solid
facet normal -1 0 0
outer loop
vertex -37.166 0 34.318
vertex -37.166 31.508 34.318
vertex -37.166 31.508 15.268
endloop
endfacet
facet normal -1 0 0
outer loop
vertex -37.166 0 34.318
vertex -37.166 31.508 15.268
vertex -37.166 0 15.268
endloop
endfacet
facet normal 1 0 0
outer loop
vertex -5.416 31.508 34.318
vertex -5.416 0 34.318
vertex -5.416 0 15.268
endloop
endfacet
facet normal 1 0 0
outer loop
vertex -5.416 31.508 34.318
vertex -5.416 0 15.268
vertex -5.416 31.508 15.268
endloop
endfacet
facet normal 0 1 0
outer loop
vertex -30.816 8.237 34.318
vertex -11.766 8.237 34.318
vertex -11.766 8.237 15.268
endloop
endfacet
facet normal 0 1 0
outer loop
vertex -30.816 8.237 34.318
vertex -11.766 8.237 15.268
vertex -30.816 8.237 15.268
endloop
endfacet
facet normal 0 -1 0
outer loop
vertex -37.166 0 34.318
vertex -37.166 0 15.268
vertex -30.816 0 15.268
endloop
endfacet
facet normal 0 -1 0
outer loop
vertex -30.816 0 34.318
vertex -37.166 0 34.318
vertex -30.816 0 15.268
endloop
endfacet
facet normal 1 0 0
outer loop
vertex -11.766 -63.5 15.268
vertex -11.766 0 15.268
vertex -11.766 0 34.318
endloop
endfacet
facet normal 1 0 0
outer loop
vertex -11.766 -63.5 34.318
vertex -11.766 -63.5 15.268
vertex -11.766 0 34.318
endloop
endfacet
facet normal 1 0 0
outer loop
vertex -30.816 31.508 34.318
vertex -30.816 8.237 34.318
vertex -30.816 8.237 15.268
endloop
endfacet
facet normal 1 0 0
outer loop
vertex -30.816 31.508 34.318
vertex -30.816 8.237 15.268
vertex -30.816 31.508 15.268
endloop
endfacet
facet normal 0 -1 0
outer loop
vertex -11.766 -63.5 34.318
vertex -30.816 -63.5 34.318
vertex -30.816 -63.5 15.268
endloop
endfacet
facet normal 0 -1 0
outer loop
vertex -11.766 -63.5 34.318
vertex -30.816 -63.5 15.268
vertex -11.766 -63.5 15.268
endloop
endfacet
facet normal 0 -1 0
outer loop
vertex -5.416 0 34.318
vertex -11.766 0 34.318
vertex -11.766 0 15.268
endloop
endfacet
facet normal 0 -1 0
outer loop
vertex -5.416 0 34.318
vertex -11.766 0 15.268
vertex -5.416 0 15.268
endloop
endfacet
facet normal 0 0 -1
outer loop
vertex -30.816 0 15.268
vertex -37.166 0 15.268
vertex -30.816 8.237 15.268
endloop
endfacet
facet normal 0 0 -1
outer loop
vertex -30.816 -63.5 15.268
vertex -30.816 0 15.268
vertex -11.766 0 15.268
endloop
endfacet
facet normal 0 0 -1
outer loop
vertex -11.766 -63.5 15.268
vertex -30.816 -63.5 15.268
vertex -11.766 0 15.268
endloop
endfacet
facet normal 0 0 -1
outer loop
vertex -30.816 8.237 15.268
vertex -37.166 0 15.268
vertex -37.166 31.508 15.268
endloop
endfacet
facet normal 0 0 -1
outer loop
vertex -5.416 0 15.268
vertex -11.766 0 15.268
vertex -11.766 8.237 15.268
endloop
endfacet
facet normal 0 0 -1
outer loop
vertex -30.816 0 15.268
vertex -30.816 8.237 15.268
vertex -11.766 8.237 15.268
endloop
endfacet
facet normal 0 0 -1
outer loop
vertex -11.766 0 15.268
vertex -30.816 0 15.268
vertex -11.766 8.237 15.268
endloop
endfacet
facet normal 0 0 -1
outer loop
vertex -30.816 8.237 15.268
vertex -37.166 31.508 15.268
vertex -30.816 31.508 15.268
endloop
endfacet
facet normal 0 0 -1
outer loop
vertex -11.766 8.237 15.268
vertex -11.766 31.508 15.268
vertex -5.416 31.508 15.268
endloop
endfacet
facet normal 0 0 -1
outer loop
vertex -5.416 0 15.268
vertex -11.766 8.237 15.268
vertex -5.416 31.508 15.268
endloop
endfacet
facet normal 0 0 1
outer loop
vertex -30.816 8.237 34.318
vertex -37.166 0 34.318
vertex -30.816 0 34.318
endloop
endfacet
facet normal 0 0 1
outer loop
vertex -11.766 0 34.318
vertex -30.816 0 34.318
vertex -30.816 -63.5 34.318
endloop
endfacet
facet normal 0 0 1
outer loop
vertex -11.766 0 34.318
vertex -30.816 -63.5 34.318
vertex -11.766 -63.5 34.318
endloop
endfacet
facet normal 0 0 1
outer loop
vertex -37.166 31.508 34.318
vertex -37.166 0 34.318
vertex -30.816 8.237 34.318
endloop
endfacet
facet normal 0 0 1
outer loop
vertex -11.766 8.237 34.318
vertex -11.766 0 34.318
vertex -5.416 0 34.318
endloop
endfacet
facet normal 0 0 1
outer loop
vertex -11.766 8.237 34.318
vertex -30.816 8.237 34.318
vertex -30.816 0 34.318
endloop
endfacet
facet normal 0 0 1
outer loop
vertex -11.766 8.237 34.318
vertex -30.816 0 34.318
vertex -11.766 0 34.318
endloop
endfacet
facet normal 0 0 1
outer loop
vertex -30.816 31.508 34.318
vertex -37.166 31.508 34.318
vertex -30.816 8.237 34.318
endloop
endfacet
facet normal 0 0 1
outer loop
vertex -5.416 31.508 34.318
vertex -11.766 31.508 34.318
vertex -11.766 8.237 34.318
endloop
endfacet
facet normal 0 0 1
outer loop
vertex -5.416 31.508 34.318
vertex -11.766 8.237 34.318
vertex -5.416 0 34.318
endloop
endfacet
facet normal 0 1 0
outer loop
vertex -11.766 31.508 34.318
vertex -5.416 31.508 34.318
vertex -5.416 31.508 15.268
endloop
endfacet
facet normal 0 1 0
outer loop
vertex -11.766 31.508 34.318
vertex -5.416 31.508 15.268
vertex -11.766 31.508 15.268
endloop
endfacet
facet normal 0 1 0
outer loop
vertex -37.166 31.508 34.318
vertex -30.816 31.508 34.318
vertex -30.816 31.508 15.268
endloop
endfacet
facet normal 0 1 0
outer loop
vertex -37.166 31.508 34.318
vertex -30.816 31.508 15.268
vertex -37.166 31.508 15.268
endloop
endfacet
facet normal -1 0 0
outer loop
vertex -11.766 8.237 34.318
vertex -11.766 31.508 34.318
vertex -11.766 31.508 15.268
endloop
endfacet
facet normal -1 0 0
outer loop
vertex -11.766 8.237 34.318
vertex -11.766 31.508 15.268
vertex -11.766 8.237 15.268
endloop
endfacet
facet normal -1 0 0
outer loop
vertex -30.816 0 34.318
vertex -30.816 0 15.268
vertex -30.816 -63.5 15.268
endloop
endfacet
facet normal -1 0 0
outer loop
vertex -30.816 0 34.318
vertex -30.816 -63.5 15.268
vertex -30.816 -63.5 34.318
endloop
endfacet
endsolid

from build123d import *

# Parameters (mm, degrees)
F0_W     = 19.05
F0_H     = 19.05
F1_DEPTH = 63.5
F3_DEPTH = 19.05


with BuildPart() as f1:
    # F0 (on Front) → F1 (new body)
    with BuildSketch(Plane.XZ):
        with Locations((-21.291444, 24.793022)):
            Rectangle(F0_W, F0_H)
    extrude(amount=F1_DEPTH)

    # F2 (on face) → F3 (join)
    with BuildSketch(Plane.XY.offset(34.318022)):
        Polygon((-30.816444, 0), (-11.766444, 0), (-5.416444, 0), (-5.416444, 31.507518), (-11.766444, 31.507518), (-11.766444, 8.236752), (-30.816444, 8.236752), (-30.816444, 31.507518), (-37.166444, 31.507518), (-37.166444, 0), align=None)
    extrude(amount=-F3_DEPTH)


solid = f1.part
